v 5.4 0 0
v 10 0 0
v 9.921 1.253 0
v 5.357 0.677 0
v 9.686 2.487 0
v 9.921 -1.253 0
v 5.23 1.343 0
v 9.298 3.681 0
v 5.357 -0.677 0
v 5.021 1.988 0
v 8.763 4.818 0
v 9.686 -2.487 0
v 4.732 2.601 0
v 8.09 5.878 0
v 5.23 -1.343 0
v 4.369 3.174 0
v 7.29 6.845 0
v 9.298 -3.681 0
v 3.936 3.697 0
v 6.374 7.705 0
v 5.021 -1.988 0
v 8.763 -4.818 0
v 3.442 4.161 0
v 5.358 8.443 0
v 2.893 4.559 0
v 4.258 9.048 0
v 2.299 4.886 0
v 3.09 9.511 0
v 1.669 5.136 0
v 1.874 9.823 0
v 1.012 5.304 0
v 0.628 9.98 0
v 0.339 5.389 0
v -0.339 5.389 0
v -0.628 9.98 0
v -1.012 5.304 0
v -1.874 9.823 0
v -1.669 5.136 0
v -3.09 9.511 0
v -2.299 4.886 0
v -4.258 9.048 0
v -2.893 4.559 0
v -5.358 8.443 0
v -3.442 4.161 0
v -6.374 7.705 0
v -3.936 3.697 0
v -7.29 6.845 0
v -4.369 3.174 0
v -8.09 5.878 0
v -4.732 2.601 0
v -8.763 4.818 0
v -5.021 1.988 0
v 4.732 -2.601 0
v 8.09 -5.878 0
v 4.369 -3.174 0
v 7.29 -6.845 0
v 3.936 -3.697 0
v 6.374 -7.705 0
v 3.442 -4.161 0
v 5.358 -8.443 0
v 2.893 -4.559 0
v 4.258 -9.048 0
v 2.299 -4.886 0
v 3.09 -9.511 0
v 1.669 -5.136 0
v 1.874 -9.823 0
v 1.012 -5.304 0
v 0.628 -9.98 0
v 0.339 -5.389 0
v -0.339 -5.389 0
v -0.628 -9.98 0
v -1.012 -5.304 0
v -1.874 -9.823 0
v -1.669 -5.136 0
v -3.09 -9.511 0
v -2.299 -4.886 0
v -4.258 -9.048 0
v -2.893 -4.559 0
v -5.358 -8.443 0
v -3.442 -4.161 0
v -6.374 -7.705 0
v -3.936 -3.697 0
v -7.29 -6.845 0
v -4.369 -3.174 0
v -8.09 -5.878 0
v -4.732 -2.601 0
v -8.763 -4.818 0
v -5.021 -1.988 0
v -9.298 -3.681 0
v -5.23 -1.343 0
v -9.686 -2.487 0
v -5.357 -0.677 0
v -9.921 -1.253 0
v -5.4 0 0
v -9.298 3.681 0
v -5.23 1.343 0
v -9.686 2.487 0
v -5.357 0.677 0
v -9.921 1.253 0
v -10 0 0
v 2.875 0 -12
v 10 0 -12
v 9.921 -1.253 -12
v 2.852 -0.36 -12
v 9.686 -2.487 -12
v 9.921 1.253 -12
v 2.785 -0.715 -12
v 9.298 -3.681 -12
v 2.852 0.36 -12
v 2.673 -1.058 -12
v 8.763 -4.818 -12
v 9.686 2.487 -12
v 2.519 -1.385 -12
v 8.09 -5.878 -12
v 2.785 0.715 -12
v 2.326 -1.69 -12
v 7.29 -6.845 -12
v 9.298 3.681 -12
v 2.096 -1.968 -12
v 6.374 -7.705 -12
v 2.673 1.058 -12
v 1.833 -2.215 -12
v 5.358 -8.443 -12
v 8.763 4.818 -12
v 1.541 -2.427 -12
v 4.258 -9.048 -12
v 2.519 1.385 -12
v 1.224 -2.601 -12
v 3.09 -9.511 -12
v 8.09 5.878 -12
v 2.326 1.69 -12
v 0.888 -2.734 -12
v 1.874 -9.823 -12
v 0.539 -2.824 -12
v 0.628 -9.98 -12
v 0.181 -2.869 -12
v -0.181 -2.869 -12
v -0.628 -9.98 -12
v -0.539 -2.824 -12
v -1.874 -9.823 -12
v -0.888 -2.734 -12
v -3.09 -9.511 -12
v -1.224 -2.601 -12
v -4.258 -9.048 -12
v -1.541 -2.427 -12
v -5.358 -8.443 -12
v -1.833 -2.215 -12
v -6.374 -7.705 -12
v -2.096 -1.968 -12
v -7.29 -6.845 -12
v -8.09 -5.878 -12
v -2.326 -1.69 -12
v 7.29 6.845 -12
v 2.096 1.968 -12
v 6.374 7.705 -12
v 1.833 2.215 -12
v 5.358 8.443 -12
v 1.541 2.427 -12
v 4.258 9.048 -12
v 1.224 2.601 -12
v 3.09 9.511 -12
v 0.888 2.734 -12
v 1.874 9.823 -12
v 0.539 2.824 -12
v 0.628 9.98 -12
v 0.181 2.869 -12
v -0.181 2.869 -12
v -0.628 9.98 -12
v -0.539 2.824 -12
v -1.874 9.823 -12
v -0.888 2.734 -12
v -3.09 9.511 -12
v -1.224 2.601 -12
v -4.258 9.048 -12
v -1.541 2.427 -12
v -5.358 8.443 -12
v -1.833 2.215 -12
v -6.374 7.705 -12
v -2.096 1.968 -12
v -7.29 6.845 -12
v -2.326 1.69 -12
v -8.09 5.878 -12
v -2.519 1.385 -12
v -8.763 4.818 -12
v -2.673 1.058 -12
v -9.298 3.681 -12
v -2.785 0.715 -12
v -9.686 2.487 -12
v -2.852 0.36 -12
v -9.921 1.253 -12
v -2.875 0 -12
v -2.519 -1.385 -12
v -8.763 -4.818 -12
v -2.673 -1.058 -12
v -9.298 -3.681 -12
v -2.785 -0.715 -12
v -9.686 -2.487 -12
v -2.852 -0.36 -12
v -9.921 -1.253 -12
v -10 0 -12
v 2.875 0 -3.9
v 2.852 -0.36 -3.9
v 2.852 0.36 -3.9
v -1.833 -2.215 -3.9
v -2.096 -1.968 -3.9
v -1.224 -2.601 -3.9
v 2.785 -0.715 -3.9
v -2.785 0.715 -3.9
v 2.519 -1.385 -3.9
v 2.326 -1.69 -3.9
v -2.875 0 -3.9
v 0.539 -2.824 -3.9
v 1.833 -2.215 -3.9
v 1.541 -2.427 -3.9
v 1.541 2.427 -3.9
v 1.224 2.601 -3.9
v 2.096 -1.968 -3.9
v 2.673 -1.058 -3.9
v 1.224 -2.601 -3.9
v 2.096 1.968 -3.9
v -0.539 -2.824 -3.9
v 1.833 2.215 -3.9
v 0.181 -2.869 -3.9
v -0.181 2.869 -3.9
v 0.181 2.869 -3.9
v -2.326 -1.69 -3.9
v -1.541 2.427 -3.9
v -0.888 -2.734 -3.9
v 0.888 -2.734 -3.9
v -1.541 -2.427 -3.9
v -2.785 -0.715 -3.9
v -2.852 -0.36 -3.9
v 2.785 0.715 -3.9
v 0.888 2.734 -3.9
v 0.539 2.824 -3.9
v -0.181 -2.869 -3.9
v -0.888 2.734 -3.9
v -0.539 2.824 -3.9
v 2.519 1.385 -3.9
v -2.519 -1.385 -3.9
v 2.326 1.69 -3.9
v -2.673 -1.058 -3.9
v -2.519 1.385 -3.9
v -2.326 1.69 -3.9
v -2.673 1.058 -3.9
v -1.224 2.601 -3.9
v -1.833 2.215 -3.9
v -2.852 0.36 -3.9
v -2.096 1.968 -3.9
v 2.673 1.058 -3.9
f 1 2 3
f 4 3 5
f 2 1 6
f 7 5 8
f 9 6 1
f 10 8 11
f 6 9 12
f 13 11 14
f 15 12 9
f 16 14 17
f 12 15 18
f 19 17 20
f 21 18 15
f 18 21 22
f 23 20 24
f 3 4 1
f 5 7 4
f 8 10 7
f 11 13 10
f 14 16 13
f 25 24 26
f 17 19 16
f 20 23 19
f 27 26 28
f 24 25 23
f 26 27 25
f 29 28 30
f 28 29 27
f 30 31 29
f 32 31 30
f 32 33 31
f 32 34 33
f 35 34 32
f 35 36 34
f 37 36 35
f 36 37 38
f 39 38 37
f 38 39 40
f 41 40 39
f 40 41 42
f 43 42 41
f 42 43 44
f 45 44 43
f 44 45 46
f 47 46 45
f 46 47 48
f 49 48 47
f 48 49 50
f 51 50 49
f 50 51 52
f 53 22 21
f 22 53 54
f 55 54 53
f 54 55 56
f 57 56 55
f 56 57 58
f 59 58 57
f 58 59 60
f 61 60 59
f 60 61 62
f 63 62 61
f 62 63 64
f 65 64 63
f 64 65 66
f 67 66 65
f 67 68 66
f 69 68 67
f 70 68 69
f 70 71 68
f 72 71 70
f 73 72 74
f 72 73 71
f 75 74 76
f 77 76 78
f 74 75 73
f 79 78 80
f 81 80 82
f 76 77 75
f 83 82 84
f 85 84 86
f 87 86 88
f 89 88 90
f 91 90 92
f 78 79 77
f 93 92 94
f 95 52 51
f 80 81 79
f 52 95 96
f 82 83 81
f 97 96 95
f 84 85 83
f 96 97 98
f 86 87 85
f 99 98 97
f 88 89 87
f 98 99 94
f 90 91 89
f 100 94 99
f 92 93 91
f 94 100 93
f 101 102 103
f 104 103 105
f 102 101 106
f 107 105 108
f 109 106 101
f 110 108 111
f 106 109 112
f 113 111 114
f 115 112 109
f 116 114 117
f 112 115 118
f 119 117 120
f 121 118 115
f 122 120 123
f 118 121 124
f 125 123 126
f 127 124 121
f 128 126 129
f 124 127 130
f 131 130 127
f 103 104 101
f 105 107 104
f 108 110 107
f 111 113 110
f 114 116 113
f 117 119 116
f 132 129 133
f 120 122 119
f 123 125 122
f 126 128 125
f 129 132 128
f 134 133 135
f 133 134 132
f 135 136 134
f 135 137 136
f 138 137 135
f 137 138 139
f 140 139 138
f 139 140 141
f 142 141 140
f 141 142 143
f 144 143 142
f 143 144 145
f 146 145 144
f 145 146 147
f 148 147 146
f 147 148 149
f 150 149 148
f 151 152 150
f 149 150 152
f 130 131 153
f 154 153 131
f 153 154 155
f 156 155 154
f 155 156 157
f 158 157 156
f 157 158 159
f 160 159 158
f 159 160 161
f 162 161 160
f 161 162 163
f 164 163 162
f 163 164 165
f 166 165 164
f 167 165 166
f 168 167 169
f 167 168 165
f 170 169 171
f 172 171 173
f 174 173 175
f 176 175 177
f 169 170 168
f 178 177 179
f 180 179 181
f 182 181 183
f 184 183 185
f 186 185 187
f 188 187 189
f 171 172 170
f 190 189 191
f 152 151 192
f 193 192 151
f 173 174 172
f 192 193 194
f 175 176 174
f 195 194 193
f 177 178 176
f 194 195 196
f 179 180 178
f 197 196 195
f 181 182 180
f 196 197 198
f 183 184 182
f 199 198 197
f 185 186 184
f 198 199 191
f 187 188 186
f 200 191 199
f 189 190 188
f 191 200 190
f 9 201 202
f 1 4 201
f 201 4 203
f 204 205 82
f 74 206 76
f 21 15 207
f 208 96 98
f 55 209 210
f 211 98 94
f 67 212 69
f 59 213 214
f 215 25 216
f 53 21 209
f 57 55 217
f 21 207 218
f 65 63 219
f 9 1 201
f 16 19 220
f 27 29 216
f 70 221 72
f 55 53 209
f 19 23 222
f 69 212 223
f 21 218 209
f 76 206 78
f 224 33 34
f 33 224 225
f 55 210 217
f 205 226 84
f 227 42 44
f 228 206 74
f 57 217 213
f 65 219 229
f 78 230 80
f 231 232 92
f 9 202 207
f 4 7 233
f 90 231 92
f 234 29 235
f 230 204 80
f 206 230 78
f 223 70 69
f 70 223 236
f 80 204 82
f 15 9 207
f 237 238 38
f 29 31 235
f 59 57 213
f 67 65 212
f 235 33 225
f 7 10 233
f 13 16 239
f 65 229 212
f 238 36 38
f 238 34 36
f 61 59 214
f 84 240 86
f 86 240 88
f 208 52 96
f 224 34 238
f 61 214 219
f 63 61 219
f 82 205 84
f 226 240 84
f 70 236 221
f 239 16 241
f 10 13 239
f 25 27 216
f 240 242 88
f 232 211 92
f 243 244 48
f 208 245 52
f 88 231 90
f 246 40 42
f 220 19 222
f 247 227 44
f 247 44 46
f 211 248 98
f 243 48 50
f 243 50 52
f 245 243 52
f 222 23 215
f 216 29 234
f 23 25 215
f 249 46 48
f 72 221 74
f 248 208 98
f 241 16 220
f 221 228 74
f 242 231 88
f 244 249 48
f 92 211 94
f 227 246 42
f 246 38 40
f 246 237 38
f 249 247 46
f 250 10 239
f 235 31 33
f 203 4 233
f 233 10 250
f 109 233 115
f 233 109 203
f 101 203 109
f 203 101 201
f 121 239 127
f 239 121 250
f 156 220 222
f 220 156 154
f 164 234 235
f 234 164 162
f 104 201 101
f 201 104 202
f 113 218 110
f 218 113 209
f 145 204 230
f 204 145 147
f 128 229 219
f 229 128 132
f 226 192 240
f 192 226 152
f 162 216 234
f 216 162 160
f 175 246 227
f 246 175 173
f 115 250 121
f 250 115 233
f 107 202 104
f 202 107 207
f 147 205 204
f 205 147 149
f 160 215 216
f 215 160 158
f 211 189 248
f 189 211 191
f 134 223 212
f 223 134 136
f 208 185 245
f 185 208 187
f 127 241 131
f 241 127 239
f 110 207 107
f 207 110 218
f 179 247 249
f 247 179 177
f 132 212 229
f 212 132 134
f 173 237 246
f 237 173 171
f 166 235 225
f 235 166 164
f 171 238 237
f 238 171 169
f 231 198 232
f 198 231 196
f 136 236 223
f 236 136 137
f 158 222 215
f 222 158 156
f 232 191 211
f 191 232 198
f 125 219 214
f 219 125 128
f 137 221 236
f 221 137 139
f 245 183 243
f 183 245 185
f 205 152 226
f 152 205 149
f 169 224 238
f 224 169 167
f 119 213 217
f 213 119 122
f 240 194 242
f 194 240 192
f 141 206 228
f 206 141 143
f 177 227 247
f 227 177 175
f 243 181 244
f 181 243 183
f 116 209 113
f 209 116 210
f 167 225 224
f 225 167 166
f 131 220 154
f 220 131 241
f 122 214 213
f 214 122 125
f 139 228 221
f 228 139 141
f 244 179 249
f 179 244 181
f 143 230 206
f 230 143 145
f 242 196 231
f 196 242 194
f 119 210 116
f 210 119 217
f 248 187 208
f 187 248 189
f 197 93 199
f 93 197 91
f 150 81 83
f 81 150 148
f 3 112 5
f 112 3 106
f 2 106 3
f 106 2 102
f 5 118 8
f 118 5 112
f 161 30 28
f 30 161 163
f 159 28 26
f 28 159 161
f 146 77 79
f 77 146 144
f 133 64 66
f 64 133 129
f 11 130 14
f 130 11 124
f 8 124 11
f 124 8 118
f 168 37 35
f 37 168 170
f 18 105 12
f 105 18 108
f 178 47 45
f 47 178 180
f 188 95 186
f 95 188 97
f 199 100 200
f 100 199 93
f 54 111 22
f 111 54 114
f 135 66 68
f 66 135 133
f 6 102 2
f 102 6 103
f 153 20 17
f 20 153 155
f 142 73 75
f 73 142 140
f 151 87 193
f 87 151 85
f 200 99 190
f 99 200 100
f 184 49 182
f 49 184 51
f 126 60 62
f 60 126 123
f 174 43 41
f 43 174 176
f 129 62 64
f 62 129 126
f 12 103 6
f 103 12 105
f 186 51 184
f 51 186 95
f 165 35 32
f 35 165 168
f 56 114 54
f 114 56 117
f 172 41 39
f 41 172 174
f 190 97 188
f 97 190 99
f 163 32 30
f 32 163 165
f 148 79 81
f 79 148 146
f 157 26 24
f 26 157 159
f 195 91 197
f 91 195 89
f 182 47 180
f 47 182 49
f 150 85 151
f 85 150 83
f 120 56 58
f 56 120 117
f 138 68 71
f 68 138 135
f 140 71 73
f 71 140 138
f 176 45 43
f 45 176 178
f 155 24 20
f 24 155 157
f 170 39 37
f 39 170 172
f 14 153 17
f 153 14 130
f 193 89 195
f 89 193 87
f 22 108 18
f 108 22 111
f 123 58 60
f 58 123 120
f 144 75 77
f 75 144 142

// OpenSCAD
$fn = 50;


difference() {
	union() {
		translate(v = [0, 0, -12.0000000000]) {
			cylinder(h = 12, r = 10.0000000000);
		}
		cylinder(h = 0, r = 13.0000000000);
	}
	union() {
		translate(v = [0, 0, 0]) {
			rotate(a = [0, 0, 0]) {
				difference() {
					union() {
						#translate(v = [0, 0, -12.0000000000]) {
							cylinder(h = 12, r = 2.6000000000);
						}
						#translate(v = [0, 0, -3.9000000000]) {
							cylinder(h = 3.9000000000, r = 10.0000000000, r1 = 2.8750000000, r2 = 5.4000000000);
						}
						#translate(v = [0, 0, -12.0000000000]) {
							cylinder(h = 12, r = 2.8750000000);
						}
						#translate(v = [0, 0, -12.0000000000]) {
							cylinder(h = 12, r = 2.6000000000);
						}
					}
					union();
				}
			}
		}
	}
}
